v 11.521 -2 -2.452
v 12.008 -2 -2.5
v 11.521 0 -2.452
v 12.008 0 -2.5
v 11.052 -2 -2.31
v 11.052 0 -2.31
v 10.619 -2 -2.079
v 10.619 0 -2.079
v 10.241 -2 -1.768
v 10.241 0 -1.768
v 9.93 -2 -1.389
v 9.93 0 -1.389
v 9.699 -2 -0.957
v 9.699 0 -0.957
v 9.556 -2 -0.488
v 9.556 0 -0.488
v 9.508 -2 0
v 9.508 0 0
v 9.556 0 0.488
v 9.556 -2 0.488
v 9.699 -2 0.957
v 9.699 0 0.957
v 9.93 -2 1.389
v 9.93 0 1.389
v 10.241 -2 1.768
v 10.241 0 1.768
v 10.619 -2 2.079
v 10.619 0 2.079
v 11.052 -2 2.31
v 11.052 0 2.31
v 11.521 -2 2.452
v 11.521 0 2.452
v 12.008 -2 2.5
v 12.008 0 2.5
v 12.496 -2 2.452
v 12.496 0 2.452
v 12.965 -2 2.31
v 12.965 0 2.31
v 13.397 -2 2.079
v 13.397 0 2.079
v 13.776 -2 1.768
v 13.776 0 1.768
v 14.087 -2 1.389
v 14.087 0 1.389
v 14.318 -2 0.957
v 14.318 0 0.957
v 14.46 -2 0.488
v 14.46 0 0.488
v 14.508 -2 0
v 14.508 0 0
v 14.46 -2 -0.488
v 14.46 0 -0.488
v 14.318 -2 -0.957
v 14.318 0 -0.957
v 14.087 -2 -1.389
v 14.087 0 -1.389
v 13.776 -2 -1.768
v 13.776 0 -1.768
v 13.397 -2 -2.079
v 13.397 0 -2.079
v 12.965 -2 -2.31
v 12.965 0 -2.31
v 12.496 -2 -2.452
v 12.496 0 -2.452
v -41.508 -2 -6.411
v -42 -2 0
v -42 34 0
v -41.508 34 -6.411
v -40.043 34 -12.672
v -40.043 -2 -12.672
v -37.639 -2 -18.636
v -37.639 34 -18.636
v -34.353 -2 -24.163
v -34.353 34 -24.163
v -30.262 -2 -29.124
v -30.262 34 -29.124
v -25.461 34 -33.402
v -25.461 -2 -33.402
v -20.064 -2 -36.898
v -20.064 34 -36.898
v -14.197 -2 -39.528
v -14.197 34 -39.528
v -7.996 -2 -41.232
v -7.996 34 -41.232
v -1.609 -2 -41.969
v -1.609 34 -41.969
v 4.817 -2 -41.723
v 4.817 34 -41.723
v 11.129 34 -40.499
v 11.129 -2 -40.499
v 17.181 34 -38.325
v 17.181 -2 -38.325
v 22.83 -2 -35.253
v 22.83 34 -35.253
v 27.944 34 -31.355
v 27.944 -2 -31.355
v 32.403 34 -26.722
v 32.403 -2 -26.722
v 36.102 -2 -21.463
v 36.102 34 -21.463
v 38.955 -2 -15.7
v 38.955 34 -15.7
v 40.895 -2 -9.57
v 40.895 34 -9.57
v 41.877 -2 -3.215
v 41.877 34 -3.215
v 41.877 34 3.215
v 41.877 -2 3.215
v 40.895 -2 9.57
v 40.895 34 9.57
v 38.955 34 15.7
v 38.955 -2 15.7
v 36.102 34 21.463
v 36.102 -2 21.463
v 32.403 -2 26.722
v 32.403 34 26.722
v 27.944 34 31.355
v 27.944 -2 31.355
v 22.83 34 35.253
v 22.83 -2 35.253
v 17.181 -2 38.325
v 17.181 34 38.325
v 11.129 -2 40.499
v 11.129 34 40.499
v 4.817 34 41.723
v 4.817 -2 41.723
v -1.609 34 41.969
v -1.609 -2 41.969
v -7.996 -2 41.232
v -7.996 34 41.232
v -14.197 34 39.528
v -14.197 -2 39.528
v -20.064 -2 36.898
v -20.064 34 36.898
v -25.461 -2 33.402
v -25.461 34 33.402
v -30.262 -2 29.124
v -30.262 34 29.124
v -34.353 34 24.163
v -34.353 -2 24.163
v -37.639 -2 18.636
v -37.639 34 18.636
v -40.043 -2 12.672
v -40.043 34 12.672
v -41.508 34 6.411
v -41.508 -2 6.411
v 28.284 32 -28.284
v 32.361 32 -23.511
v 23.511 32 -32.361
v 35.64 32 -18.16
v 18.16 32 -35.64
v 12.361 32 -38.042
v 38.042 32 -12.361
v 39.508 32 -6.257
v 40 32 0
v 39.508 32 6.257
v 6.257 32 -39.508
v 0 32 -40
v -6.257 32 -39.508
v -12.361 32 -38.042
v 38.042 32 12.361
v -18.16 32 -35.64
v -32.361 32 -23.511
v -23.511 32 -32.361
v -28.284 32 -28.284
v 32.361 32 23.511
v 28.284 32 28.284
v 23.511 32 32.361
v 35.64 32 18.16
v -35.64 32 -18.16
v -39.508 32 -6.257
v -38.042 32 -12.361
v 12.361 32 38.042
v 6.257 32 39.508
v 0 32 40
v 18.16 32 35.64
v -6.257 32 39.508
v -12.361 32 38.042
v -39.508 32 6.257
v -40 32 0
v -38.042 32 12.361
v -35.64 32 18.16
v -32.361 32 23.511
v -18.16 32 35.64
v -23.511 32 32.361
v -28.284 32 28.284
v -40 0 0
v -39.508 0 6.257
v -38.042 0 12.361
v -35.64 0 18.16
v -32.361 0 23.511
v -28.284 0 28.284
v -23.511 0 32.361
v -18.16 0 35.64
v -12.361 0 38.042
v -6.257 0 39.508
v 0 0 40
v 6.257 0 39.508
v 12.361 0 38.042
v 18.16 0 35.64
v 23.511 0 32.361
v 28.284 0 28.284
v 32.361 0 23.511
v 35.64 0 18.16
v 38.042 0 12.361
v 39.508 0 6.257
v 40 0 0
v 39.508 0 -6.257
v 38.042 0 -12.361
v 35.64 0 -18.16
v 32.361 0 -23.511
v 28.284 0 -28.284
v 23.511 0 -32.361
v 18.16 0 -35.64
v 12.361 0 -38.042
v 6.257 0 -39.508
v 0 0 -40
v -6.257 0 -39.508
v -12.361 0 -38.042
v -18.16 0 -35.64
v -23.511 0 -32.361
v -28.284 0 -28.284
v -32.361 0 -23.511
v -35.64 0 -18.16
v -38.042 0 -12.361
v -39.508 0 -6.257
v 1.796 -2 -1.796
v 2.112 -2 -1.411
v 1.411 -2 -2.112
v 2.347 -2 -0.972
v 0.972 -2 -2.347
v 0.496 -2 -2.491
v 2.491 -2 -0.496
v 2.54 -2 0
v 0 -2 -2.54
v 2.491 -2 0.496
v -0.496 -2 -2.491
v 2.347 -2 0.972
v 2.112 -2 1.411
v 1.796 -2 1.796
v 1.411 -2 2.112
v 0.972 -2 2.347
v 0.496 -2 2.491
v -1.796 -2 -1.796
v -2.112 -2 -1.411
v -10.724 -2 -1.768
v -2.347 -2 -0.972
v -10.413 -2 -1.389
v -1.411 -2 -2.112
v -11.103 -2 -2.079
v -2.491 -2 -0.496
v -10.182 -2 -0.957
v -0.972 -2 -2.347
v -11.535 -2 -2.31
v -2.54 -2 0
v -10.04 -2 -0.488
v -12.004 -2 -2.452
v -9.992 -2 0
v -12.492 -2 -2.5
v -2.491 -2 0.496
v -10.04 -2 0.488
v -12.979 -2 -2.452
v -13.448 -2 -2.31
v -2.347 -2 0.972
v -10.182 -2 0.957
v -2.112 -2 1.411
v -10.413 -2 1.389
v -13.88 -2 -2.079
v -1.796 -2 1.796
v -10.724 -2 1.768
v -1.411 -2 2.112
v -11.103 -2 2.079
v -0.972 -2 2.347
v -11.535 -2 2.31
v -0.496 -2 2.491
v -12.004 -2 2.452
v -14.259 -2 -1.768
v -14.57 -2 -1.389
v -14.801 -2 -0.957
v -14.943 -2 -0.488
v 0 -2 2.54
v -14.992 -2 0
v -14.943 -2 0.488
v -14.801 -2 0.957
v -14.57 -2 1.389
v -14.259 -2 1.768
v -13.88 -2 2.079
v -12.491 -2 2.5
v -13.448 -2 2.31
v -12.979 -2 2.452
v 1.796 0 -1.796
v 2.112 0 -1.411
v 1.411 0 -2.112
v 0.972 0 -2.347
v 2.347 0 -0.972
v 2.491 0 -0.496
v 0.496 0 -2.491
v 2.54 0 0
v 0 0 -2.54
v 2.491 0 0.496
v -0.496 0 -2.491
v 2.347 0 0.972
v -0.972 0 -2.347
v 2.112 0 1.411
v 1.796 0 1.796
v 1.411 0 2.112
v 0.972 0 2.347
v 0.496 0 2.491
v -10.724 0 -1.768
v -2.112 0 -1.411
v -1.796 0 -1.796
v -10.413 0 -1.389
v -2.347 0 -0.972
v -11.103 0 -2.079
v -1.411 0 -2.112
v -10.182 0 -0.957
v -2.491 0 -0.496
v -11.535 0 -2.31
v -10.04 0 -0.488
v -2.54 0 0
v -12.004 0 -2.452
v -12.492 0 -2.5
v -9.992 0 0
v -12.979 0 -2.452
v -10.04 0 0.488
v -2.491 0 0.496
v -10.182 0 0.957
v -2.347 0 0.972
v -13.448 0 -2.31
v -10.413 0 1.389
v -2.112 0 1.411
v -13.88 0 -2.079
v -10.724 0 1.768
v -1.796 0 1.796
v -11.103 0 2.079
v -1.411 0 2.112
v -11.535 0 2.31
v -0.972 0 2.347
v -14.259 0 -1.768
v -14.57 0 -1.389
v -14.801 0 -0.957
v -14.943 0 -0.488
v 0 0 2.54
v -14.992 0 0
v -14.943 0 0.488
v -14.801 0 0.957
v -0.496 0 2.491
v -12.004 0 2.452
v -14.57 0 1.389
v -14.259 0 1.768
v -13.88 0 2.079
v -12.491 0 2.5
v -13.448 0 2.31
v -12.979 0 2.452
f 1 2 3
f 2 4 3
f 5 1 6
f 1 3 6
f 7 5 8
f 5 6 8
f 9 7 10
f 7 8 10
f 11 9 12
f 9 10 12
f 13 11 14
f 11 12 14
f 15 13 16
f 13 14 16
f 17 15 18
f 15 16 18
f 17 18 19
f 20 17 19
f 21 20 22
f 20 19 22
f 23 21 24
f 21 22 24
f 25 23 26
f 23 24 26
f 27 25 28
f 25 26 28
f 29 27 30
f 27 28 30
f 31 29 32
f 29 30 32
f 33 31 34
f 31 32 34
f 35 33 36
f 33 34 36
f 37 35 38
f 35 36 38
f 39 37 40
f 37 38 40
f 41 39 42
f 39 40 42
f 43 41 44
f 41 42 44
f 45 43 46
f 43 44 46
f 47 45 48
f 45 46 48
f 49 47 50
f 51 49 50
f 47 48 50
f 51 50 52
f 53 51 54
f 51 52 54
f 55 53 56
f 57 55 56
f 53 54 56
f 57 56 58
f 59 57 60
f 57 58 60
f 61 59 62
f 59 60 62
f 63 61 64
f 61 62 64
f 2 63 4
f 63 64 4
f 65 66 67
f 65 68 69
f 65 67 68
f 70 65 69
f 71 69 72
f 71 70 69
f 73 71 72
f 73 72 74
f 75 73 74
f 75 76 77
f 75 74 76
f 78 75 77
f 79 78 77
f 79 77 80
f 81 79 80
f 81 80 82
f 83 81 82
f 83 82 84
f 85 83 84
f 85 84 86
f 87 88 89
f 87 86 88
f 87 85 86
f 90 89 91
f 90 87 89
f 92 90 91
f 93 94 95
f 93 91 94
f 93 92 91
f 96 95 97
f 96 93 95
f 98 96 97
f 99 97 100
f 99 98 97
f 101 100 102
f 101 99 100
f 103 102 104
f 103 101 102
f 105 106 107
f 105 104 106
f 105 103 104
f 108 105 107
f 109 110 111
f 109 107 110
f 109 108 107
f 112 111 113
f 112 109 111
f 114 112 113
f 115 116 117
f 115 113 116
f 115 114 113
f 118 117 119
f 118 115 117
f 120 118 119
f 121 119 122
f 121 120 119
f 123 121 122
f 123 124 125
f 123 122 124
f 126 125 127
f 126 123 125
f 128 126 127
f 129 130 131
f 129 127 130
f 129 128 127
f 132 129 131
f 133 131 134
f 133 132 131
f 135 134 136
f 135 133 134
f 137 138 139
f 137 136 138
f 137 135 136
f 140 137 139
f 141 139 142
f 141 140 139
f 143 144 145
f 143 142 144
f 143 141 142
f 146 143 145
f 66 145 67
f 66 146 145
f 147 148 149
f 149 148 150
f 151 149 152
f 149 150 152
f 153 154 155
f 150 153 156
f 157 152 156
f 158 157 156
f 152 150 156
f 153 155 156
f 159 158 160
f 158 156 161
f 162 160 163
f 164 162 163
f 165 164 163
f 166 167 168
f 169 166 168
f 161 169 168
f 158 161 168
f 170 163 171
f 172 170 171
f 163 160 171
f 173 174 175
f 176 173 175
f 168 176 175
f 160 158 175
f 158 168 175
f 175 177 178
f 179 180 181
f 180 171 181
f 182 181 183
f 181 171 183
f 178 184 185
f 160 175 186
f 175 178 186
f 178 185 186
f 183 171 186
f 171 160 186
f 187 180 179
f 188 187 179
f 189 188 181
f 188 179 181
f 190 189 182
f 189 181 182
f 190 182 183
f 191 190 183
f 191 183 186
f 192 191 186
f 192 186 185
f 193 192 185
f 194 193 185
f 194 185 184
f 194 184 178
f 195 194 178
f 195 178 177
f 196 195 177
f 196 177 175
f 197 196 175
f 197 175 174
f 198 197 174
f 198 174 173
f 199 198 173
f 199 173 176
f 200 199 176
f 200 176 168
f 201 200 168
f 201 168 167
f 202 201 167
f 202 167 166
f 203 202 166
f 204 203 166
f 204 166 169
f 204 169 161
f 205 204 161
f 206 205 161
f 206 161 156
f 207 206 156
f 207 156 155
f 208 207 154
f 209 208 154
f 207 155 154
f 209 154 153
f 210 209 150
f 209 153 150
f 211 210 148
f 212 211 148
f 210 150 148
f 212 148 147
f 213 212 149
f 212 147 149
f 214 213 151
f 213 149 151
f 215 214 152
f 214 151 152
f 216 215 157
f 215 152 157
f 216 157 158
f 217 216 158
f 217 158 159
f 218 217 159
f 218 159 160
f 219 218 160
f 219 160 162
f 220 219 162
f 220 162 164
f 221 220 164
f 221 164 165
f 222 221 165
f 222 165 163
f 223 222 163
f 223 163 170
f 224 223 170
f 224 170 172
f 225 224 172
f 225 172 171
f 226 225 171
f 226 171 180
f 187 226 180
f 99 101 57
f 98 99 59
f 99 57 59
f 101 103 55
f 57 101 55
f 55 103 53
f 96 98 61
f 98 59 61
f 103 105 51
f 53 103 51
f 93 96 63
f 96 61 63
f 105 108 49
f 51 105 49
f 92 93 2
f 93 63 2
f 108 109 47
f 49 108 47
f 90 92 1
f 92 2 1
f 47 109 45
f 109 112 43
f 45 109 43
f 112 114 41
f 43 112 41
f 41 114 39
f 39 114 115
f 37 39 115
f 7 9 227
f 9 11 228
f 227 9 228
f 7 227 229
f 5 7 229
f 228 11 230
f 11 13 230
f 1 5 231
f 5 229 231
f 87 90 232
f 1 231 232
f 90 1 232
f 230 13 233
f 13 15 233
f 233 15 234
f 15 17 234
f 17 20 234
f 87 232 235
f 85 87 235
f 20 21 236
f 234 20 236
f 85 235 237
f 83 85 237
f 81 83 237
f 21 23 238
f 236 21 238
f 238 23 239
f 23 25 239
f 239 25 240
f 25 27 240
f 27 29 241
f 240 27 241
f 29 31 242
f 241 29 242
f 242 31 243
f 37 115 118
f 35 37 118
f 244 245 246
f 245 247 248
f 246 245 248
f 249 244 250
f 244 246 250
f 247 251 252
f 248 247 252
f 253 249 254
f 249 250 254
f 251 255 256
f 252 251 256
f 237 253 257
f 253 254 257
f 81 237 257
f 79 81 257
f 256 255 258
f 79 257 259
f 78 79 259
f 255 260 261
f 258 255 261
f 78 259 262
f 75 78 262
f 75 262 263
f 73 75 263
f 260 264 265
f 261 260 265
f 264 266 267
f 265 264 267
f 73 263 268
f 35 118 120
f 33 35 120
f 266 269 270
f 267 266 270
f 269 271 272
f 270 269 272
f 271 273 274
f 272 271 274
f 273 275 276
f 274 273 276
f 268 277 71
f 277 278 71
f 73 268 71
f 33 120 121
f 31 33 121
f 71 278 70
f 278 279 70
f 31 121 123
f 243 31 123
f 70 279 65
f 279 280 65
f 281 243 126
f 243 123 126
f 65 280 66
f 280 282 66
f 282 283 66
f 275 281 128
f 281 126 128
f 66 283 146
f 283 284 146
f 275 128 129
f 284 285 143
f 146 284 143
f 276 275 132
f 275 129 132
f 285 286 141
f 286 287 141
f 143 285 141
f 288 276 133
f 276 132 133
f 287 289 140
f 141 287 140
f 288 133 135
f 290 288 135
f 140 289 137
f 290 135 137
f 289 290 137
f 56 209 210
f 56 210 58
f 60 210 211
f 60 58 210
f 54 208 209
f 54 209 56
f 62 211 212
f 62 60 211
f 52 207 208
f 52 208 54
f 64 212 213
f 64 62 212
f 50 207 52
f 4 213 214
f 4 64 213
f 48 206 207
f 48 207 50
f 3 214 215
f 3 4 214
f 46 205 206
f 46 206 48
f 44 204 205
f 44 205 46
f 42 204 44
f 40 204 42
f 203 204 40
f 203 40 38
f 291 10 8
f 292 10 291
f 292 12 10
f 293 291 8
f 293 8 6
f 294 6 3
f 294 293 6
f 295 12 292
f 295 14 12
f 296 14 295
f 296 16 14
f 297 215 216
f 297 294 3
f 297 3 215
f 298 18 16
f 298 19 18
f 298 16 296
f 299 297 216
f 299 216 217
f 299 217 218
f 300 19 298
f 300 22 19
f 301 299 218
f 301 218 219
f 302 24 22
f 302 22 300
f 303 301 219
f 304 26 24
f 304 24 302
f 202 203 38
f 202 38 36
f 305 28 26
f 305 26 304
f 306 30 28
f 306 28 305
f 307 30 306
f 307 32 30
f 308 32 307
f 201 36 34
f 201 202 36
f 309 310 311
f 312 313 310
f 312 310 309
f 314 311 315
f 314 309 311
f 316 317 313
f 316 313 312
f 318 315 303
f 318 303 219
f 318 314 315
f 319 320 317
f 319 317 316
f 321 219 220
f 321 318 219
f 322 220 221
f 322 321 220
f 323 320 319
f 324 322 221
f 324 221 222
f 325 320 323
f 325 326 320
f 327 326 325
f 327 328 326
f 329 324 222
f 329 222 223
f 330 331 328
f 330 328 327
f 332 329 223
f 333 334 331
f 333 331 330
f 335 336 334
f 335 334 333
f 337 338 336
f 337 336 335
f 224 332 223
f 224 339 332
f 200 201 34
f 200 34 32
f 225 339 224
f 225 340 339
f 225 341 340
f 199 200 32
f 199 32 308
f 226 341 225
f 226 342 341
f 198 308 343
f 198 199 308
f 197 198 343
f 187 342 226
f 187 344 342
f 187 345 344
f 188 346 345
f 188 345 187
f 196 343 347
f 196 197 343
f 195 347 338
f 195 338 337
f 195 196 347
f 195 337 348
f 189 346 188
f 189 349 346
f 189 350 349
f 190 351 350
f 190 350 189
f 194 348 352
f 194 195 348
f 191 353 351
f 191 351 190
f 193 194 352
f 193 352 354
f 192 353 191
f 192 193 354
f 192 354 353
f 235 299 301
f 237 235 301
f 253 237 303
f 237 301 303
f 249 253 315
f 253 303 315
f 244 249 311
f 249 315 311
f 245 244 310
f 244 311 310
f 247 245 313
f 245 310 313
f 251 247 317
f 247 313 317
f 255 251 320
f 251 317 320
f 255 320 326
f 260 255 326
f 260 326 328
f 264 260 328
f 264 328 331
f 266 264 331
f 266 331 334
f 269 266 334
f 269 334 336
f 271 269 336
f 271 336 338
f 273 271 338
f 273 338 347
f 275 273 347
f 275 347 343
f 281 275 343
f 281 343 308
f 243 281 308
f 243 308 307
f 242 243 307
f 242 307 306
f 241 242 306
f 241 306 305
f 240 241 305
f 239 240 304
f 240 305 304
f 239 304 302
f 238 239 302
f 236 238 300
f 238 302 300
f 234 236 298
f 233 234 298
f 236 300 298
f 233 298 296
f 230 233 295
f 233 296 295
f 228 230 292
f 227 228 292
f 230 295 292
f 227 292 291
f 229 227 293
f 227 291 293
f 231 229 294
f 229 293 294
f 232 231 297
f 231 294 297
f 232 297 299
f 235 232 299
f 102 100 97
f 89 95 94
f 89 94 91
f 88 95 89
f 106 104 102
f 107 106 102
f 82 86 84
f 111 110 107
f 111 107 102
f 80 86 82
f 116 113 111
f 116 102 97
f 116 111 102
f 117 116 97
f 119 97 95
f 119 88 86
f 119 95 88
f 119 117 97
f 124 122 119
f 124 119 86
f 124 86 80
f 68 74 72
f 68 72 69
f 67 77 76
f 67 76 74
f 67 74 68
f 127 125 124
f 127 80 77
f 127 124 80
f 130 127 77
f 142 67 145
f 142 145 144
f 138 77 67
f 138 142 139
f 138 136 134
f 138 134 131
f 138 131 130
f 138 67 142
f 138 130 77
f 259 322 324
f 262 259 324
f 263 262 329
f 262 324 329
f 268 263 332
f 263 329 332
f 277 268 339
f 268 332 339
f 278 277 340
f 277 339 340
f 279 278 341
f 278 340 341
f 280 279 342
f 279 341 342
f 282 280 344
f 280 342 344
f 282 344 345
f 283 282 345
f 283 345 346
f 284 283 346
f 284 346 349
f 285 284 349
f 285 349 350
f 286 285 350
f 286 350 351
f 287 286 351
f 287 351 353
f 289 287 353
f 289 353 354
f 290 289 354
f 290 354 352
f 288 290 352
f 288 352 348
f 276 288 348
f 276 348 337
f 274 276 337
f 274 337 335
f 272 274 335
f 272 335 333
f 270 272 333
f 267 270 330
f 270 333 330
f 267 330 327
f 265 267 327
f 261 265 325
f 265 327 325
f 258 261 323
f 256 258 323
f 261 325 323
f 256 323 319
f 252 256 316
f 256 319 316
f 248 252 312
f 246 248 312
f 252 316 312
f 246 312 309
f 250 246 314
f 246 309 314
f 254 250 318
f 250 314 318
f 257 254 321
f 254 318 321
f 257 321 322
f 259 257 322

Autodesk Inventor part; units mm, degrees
ref_plane "YZ Plane" through (0, 0, 0) normal (1, 0, 0) x (0, 1, 0)
ref_plane "XZ Plane" through (0, 0, 0) normal (0, 1, 0) x (-1, 0, 0)
ref_plane "XY Plane" through (0, 0, 0) normal (0, 0, 1) x (1, 0, 0)
sketch "Sketch1" plane through (0, 0, 0) normal (0, 0, 1) x (1, 0, 0)
  line L0 (-40, 0) -> (-40, 32)
  line L1 (-42, 34) -> (-42, -2)
  line L2 (-40, 0) -> (0, 0)
  line L3 (0, 0) -> (0, -2)
  line L4 (0, -2) -> (-42, -2)
  line L5 (0, -10.8) -> (0, 50.8) projected
  line L6 (-42, 34) -> (0, 34)
  line L7 (-40, 32) -> (0, 32)
  line L8 (0, 32) -> (0, 34)
  dimension "d5" = 2
  dimension "radius" = 40
  dimension "d7" = 2
  dimension "d37" = 2
  dimension "SampleVolumeInnerHeight" = 32
revolve "Revolution1" add sketch "Sketch1" angle 360 about axis through (0, -10, 0) along (0, 1, 0) contours L2 L3 L4 L1 L6 L5 L7 L0
sketch "Sketch3" plane through (0, -2, 0) normal (0, -1, 0) x (1, 0, 0)
  line L0 (-12.4915, 0) -> (12.0084, 0)
  point P0 (0, 0)
  dimension "DistanceBetweenHolesSweep" = 24.5
hole "Hole2" at (0, -2, 0) direction (0, 1, 0) diameter 5.08 depth 2
hole "Hole3" at (-12.4915, -2, 0) at (12.0084, -2, 0) direction (0, 1, 0) diameter 5 depth 2
equation "\"d5\" = thickness"
equation "\"radius\" = 0.5 * SaltDiameter"
equation "\"d7\" = thickness"
equation "\"d37\" = crucible_thickness"
equation "\"SampleVolumeInnerHeight\" = 4 * SaltThickness"
equation "\"d22\" = fixation_holes_diameter"
equation "\"d30\" = PenetrationOuterDiameter"
equation "\"thickness\" = crucible_thickness"
equation "\"SaltDiameter\" = 80"
equation "\"crucible_thickness\" = 2"
equation "\"SaltThickness\" = 8"
equation "\"fixation_holes_diameter\" = 5.08"
equation "\"PenetrationOuterDiameter\" = 5"
properties part number "UpstreamVolume" material "Nickel-Copper Alloy 400"
